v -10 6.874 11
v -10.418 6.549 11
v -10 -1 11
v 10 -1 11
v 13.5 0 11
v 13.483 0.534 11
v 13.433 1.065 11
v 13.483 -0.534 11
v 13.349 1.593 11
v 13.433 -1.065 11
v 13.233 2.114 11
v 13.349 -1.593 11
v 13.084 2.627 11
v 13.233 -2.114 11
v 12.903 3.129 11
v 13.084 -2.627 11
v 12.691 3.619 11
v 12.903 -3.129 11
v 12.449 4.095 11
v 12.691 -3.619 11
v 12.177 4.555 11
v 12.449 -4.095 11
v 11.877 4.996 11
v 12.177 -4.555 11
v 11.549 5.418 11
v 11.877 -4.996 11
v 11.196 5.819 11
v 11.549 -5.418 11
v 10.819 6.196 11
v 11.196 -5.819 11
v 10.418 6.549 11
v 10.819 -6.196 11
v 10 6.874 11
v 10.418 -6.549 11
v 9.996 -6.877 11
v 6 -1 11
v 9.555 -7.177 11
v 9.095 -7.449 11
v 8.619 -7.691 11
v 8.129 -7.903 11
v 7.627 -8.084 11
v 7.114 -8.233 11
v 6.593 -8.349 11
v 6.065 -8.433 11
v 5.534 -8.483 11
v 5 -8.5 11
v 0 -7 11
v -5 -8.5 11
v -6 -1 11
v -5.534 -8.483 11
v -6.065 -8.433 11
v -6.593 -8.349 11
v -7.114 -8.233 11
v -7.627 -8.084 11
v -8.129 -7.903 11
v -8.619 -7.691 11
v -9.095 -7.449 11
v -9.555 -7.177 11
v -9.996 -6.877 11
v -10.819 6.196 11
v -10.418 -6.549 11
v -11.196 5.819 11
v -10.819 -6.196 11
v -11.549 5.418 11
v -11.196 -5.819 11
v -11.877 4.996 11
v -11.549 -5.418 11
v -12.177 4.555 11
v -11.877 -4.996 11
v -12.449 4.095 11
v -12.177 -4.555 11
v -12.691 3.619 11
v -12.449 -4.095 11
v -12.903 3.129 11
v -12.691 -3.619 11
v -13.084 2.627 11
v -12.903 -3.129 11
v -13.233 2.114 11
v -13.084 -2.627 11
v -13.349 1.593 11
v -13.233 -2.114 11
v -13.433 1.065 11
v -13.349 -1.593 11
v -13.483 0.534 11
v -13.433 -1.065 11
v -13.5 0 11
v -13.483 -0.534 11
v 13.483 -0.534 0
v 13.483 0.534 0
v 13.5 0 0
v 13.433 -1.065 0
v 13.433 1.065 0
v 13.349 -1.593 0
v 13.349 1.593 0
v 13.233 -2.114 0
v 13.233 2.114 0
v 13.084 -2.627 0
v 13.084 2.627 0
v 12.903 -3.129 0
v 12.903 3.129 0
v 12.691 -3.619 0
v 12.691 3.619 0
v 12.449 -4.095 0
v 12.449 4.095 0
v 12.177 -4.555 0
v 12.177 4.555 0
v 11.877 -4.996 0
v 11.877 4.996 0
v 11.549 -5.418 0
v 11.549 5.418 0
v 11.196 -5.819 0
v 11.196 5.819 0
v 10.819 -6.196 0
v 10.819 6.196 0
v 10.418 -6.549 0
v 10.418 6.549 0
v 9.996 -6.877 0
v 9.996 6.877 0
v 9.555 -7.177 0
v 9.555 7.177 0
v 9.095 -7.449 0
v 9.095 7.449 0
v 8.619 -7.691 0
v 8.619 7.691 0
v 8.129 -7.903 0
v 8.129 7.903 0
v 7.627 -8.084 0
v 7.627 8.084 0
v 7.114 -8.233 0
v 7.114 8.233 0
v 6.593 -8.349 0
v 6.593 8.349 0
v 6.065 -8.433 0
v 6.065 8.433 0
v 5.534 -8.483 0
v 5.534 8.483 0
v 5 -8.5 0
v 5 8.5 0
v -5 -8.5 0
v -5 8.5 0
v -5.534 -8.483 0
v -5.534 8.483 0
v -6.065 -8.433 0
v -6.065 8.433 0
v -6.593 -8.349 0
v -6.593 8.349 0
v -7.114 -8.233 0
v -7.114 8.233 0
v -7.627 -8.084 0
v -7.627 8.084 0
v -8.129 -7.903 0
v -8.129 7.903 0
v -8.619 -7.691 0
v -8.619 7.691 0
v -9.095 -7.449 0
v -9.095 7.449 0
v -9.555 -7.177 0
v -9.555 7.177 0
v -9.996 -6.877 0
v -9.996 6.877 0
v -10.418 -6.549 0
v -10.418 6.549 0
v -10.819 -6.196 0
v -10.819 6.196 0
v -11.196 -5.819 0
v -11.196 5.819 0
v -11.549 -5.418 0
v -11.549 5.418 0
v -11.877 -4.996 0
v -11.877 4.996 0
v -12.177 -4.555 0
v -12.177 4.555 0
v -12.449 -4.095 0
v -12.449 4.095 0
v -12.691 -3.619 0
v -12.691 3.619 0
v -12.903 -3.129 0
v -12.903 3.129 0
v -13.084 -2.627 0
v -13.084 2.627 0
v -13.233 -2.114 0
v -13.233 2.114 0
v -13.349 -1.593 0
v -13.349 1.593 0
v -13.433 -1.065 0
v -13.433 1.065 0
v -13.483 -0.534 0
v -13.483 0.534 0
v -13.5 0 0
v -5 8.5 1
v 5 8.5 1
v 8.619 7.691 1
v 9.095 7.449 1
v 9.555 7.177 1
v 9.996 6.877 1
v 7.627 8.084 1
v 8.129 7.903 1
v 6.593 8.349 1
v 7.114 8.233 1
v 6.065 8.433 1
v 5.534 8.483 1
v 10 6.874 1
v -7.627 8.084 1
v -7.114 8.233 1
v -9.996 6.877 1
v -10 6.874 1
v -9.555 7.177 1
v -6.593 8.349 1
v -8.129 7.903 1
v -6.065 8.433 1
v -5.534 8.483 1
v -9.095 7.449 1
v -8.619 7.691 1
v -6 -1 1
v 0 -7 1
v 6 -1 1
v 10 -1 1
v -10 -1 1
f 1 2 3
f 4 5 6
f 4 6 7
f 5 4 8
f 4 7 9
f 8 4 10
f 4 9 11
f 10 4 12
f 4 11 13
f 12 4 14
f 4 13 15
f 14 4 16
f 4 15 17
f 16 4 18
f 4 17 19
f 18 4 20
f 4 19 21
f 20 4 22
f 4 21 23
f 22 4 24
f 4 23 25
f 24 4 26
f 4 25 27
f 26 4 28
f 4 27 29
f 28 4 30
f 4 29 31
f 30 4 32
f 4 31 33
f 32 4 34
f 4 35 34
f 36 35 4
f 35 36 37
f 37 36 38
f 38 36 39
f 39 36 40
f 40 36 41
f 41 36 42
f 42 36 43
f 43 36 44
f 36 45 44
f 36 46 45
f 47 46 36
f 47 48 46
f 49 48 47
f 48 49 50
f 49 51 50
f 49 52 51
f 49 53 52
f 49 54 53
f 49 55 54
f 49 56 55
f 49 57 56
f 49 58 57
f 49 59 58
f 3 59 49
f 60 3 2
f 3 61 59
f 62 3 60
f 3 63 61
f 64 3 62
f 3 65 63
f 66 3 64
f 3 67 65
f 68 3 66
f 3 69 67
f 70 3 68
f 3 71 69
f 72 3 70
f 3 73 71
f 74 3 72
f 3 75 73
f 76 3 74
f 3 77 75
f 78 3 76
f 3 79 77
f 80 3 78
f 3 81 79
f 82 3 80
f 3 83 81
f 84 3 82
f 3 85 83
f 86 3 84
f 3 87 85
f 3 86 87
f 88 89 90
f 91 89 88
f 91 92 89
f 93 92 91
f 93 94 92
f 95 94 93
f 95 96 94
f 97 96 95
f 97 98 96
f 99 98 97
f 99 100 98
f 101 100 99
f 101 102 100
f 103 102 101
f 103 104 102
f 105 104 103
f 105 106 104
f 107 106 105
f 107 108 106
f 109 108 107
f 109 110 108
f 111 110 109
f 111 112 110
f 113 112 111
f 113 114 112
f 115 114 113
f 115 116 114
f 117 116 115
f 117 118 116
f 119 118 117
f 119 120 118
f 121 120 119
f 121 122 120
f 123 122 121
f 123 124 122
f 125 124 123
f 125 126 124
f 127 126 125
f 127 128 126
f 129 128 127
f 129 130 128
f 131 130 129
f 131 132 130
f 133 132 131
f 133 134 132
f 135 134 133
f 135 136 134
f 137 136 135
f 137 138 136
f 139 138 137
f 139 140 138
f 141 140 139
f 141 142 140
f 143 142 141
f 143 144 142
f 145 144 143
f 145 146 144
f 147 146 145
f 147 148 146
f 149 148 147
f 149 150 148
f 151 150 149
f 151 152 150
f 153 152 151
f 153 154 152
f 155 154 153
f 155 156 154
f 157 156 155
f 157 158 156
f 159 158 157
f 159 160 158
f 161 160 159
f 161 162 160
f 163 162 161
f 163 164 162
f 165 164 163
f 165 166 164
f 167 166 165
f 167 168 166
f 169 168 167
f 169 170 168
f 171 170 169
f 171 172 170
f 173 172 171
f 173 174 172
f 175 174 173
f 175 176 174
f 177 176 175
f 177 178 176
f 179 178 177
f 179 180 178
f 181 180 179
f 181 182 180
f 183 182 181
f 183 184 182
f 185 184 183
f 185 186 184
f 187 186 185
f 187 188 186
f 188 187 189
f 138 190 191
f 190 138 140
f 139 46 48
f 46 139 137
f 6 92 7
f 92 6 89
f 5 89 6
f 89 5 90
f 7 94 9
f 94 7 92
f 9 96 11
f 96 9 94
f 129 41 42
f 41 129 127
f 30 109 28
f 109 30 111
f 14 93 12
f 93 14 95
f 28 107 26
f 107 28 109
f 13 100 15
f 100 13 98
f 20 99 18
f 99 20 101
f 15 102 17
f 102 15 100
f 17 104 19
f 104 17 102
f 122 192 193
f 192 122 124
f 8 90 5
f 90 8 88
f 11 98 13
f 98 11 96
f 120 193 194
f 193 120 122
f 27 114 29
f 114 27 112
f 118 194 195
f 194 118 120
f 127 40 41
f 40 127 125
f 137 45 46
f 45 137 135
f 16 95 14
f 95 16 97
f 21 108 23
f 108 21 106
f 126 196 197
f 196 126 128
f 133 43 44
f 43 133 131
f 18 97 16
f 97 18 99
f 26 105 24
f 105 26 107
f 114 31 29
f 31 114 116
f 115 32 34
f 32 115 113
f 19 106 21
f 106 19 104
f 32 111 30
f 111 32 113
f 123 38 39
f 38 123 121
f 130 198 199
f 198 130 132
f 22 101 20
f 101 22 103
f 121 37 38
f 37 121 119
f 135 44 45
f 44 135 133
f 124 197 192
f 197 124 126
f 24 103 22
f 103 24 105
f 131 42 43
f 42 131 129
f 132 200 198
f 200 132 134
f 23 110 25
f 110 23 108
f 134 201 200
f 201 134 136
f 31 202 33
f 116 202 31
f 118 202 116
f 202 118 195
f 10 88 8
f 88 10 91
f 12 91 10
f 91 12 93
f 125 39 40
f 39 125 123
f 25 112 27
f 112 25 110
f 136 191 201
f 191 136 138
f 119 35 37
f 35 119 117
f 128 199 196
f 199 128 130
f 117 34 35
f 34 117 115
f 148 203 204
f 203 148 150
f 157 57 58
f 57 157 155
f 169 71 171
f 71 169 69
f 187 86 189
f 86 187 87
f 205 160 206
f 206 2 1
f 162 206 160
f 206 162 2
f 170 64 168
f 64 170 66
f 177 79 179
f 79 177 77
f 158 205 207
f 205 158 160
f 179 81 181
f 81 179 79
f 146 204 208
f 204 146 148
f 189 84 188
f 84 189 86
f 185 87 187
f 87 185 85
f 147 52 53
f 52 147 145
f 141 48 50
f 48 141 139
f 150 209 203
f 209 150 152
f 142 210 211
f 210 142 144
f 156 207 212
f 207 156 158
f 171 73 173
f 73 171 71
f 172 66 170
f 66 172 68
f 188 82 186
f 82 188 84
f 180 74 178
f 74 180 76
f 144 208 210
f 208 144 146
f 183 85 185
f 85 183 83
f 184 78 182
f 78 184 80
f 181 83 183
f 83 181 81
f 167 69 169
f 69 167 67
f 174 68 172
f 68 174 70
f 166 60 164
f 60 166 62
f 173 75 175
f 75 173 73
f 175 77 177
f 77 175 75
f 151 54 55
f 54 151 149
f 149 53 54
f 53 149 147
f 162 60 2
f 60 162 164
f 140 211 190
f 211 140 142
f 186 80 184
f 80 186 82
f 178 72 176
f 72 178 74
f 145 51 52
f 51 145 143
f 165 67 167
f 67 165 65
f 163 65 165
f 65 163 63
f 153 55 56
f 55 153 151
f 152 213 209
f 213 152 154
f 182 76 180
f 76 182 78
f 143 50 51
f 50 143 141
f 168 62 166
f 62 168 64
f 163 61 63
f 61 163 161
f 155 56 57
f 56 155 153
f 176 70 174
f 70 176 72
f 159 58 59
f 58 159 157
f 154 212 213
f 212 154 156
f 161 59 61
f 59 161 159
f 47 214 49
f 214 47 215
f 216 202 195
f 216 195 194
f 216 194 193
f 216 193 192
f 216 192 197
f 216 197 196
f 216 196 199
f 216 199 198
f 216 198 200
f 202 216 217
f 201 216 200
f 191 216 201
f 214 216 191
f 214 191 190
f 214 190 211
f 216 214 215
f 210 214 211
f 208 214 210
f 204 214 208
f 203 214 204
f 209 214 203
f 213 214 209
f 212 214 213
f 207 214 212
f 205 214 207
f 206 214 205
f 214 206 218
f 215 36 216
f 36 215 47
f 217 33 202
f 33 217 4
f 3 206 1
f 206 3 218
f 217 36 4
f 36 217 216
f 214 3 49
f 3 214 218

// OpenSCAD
difference(){
	union(){ 

              
            

        translate([-5, -8.5,0]){
           cube([10,17,11], center=false);
        }                
        translate([0+5,0,0]){
            rotate([0,0,0]){
                cylinder(h=11, r=8.5, $fn=100, center=false);
            }   
        }
        translate([0-5,0,0]){
            rotate([0,0,0]){
                cylinder(h=11, r=8.5, $fn=100, center=false);
            }   
        }


            



	}
	union() {
        translate([0,-7,1]){
            rotate([0,0,45]){
                cube([10,10,24], center=false);
            }
        }                

        translate([-10,-1,1]){
          cube([20,20,11], center=false);
        }                


	}
}
